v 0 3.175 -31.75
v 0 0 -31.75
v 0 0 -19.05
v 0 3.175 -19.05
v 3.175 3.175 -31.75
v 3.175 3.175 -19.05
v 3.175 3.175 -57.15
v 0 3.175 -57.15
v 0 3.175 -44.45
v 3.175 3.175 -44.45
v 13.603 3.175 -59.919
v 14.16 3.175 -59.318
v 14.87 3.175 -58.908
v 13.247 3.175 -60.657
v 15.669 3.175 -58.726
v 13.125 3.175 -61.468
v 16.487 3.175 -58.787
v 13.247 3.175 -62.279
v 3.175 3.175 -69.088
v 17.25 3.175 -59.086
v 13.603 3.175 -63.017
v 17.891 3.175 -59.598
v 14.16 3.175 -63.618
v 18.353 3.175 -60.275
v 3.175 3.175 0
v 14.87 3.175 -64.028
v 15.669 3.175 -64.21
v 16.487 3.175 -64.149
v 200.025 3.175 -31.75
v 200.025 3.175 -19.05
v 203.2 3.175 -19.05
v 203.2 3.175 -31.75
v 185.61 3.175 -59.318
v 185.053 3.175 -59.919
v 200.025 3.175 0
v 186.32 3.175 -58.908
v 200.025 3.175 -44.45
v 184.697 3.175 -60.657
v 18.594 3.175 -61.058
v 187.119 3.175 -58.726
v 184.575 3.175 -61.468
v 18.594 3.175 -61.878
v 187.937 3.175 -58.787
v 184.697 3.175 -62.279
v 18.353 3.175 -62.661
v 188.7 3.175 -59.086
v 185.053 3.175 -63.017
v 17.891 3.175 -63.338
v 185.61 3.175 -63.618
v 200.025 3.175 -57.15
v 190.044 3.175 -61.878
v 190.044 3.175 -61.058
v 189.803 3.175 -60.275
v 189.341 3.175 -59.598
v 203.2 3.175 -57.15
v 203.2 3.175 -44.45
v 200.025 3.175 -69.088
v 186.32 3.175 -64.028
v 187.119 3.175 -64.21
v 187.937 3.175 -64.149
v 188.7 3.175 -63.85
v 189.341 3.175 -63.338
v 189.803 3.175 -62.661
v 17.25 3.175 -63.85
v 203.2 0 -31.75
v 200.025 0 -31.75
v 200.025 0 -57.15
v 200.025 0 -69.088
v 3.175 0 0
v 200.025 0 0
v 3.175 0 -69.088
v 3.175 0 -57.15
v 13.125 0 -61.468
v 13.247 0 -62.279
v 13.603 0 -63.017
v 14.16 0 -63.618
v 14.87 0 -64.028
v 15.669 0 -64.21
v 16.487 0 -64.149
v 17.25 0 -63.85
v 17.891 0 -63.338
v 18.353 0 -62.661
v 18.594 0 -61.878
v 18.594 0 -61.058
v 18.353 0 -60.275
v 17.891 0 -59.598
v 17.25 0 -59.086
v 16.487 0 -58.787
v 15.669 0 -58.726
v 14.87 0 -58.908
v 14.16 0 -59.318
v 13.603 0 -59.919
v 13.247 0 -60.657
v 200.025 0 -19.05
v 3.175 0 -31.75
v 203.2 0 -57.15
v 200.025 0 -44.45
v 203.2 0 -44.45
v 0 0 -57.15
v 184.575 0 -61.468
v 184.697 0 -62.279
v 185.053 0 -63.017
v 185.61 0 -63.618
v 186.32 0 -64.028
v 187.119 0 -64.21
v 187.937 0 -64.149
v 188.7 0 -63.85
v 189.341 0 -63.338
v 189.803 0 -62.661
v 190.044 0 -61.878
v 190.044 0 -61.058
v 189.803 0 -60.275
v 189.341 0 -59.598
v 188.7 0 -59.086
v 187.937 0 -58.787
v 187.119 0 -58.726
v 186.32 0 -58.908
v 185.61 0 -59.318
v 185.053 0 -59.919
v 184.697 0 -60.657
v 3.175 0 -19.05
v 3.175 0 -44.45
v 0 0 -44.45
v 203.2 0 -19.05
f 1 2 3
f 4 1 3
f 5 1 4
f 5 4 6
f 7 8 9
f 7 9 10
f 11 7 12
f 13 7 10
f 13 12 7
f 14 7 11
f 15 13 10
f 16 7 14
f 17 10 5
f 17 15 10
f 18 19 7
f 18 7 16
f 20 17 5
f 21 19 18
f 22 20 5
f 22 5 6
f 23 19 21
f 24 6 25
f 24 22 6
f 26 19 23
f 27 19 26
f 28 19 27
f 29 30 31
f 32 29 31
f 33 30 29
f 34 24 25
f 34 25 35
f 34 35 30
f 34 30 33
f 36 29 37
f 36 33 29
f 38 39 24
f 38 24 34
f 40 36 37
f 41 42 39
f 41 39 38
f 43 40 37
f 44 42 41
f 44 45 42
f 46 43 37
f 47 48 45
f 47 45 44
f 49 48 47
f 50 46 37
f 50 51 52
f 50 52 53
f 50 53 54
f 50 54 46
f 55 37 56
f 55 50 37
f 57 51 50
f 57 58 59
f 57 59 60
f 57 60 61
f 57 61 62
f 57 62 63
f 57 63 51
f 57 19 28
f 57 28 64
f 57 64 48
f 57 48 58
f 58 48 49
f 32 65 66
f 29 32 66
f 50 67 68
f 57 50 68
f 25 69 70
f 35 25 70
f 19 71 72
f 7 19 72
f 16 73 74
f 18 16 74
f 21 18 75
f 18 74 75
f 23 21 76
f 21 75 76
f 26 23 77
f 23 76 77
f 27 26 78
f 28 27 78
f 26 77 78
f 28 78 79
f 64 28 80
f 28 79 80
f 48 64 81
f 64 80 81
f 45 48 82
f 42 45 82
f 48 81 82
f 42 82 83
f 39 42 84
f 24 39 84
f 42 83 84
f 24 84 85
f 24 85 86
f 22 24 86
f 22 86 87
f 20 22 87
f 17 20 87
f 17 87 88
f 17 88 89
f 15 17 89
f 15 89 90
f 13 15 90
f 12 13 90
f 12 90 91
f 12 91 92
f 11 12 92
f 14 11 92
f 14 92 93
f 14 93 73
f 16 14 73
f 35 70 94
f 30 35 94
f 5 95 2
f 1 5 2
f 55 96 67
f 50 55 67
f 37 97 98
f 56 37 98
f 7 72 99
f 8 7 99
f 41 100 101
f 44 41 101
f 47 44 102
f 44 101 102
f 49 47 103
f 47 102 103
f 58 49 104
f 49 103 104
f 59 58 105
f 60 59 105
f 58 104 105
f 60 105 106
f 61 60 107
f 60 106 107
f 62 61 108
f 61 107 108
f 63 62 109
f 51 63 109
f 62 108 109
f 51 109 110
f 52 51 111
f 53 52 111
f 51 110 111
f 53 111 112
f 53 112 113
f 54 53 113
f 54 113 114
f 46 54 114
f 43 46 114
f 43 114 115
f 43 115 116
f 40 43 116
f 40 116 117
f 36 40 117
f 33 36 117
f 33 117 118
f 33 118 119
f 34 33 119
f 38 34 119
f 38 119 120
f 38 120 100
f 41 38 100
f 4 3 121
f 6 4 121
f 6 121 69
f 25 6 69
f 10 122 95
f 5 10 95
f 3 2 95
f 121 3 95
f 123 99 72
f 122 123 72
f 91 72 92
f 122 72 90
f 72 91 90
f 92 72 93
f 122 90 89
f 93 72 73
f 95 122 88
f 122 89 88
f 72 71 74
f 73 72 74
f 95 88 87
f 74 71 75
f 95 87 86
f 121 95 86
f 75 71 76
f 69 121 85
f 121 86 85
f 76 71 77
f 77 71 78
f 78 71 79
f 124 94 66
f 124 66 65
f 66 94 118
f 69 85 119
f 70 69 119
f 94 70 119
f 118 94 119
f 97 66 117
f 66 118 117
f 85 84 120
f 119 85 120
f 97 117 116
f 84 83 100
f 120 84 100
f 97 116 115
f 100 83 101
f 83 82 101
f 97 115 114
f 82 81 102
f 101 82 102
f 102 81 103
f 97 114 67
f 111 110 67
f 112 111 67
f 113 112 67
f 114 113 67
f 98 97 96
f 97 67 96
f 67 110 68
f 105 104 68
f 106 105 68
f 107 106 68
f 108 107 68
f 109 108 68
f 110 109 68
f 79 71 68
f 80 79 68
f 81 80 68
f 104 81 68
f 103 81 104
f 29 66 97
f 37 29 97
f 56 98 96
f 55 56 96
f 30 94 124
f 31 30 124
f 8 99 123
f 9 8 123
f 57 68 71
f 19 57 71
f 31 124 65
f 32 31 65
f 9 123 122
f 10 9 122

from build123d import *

# Parameters (mm, degrees)
BOSS_EXTRUDE1_DEPTH  = 3.175
M5_CLEARANCE_HOLE1_D = 5.5


with BuildPart() as part:
    # Sketch1 → Boss-Extrude1 (new body)
    with BuildSketch(Plane(origin=(0, 0, 0), x_dir=(1, 0, 0), z_dir=(0, 1, 0))):
        Polygon((101.6, 0), (101.6, 69.088), (3.175, 69.088), (3.175, 57.15), (0, 57.15), (0, 44.45), (3.175, 44.45), (3.175, 31.75), (0, 31.75), (0, 19.05), (3.175, 19.05), (3.175, 0), align=None)
        Polygon((200.025, 69.088), (101.6, 69.088), (101.6, 0), (200.025, 0), (200.025, 19.05), (203.2, 19.05), (203.2, 31.75), (200.025, 31.75), (200.025, 44.45), (203.2, 44.45), (203.2, 57.15), (200.025, 57.15), align=None)
    extrude(amount=BOSS_EXTRUDE1_DEPTH)

    # M5 Clearance Hole1 (through all)
    with Locations(Plane(origin=(0, 3.175, 0), x_dir=(1, 0, 0), z_dir=(0, 1, 0))):
        with Locations((15.875, 61.468), (187.325, 61.468)):
            Hole(M5_CLEARANCE_HOLE1_D / 2)


solid = part.part
